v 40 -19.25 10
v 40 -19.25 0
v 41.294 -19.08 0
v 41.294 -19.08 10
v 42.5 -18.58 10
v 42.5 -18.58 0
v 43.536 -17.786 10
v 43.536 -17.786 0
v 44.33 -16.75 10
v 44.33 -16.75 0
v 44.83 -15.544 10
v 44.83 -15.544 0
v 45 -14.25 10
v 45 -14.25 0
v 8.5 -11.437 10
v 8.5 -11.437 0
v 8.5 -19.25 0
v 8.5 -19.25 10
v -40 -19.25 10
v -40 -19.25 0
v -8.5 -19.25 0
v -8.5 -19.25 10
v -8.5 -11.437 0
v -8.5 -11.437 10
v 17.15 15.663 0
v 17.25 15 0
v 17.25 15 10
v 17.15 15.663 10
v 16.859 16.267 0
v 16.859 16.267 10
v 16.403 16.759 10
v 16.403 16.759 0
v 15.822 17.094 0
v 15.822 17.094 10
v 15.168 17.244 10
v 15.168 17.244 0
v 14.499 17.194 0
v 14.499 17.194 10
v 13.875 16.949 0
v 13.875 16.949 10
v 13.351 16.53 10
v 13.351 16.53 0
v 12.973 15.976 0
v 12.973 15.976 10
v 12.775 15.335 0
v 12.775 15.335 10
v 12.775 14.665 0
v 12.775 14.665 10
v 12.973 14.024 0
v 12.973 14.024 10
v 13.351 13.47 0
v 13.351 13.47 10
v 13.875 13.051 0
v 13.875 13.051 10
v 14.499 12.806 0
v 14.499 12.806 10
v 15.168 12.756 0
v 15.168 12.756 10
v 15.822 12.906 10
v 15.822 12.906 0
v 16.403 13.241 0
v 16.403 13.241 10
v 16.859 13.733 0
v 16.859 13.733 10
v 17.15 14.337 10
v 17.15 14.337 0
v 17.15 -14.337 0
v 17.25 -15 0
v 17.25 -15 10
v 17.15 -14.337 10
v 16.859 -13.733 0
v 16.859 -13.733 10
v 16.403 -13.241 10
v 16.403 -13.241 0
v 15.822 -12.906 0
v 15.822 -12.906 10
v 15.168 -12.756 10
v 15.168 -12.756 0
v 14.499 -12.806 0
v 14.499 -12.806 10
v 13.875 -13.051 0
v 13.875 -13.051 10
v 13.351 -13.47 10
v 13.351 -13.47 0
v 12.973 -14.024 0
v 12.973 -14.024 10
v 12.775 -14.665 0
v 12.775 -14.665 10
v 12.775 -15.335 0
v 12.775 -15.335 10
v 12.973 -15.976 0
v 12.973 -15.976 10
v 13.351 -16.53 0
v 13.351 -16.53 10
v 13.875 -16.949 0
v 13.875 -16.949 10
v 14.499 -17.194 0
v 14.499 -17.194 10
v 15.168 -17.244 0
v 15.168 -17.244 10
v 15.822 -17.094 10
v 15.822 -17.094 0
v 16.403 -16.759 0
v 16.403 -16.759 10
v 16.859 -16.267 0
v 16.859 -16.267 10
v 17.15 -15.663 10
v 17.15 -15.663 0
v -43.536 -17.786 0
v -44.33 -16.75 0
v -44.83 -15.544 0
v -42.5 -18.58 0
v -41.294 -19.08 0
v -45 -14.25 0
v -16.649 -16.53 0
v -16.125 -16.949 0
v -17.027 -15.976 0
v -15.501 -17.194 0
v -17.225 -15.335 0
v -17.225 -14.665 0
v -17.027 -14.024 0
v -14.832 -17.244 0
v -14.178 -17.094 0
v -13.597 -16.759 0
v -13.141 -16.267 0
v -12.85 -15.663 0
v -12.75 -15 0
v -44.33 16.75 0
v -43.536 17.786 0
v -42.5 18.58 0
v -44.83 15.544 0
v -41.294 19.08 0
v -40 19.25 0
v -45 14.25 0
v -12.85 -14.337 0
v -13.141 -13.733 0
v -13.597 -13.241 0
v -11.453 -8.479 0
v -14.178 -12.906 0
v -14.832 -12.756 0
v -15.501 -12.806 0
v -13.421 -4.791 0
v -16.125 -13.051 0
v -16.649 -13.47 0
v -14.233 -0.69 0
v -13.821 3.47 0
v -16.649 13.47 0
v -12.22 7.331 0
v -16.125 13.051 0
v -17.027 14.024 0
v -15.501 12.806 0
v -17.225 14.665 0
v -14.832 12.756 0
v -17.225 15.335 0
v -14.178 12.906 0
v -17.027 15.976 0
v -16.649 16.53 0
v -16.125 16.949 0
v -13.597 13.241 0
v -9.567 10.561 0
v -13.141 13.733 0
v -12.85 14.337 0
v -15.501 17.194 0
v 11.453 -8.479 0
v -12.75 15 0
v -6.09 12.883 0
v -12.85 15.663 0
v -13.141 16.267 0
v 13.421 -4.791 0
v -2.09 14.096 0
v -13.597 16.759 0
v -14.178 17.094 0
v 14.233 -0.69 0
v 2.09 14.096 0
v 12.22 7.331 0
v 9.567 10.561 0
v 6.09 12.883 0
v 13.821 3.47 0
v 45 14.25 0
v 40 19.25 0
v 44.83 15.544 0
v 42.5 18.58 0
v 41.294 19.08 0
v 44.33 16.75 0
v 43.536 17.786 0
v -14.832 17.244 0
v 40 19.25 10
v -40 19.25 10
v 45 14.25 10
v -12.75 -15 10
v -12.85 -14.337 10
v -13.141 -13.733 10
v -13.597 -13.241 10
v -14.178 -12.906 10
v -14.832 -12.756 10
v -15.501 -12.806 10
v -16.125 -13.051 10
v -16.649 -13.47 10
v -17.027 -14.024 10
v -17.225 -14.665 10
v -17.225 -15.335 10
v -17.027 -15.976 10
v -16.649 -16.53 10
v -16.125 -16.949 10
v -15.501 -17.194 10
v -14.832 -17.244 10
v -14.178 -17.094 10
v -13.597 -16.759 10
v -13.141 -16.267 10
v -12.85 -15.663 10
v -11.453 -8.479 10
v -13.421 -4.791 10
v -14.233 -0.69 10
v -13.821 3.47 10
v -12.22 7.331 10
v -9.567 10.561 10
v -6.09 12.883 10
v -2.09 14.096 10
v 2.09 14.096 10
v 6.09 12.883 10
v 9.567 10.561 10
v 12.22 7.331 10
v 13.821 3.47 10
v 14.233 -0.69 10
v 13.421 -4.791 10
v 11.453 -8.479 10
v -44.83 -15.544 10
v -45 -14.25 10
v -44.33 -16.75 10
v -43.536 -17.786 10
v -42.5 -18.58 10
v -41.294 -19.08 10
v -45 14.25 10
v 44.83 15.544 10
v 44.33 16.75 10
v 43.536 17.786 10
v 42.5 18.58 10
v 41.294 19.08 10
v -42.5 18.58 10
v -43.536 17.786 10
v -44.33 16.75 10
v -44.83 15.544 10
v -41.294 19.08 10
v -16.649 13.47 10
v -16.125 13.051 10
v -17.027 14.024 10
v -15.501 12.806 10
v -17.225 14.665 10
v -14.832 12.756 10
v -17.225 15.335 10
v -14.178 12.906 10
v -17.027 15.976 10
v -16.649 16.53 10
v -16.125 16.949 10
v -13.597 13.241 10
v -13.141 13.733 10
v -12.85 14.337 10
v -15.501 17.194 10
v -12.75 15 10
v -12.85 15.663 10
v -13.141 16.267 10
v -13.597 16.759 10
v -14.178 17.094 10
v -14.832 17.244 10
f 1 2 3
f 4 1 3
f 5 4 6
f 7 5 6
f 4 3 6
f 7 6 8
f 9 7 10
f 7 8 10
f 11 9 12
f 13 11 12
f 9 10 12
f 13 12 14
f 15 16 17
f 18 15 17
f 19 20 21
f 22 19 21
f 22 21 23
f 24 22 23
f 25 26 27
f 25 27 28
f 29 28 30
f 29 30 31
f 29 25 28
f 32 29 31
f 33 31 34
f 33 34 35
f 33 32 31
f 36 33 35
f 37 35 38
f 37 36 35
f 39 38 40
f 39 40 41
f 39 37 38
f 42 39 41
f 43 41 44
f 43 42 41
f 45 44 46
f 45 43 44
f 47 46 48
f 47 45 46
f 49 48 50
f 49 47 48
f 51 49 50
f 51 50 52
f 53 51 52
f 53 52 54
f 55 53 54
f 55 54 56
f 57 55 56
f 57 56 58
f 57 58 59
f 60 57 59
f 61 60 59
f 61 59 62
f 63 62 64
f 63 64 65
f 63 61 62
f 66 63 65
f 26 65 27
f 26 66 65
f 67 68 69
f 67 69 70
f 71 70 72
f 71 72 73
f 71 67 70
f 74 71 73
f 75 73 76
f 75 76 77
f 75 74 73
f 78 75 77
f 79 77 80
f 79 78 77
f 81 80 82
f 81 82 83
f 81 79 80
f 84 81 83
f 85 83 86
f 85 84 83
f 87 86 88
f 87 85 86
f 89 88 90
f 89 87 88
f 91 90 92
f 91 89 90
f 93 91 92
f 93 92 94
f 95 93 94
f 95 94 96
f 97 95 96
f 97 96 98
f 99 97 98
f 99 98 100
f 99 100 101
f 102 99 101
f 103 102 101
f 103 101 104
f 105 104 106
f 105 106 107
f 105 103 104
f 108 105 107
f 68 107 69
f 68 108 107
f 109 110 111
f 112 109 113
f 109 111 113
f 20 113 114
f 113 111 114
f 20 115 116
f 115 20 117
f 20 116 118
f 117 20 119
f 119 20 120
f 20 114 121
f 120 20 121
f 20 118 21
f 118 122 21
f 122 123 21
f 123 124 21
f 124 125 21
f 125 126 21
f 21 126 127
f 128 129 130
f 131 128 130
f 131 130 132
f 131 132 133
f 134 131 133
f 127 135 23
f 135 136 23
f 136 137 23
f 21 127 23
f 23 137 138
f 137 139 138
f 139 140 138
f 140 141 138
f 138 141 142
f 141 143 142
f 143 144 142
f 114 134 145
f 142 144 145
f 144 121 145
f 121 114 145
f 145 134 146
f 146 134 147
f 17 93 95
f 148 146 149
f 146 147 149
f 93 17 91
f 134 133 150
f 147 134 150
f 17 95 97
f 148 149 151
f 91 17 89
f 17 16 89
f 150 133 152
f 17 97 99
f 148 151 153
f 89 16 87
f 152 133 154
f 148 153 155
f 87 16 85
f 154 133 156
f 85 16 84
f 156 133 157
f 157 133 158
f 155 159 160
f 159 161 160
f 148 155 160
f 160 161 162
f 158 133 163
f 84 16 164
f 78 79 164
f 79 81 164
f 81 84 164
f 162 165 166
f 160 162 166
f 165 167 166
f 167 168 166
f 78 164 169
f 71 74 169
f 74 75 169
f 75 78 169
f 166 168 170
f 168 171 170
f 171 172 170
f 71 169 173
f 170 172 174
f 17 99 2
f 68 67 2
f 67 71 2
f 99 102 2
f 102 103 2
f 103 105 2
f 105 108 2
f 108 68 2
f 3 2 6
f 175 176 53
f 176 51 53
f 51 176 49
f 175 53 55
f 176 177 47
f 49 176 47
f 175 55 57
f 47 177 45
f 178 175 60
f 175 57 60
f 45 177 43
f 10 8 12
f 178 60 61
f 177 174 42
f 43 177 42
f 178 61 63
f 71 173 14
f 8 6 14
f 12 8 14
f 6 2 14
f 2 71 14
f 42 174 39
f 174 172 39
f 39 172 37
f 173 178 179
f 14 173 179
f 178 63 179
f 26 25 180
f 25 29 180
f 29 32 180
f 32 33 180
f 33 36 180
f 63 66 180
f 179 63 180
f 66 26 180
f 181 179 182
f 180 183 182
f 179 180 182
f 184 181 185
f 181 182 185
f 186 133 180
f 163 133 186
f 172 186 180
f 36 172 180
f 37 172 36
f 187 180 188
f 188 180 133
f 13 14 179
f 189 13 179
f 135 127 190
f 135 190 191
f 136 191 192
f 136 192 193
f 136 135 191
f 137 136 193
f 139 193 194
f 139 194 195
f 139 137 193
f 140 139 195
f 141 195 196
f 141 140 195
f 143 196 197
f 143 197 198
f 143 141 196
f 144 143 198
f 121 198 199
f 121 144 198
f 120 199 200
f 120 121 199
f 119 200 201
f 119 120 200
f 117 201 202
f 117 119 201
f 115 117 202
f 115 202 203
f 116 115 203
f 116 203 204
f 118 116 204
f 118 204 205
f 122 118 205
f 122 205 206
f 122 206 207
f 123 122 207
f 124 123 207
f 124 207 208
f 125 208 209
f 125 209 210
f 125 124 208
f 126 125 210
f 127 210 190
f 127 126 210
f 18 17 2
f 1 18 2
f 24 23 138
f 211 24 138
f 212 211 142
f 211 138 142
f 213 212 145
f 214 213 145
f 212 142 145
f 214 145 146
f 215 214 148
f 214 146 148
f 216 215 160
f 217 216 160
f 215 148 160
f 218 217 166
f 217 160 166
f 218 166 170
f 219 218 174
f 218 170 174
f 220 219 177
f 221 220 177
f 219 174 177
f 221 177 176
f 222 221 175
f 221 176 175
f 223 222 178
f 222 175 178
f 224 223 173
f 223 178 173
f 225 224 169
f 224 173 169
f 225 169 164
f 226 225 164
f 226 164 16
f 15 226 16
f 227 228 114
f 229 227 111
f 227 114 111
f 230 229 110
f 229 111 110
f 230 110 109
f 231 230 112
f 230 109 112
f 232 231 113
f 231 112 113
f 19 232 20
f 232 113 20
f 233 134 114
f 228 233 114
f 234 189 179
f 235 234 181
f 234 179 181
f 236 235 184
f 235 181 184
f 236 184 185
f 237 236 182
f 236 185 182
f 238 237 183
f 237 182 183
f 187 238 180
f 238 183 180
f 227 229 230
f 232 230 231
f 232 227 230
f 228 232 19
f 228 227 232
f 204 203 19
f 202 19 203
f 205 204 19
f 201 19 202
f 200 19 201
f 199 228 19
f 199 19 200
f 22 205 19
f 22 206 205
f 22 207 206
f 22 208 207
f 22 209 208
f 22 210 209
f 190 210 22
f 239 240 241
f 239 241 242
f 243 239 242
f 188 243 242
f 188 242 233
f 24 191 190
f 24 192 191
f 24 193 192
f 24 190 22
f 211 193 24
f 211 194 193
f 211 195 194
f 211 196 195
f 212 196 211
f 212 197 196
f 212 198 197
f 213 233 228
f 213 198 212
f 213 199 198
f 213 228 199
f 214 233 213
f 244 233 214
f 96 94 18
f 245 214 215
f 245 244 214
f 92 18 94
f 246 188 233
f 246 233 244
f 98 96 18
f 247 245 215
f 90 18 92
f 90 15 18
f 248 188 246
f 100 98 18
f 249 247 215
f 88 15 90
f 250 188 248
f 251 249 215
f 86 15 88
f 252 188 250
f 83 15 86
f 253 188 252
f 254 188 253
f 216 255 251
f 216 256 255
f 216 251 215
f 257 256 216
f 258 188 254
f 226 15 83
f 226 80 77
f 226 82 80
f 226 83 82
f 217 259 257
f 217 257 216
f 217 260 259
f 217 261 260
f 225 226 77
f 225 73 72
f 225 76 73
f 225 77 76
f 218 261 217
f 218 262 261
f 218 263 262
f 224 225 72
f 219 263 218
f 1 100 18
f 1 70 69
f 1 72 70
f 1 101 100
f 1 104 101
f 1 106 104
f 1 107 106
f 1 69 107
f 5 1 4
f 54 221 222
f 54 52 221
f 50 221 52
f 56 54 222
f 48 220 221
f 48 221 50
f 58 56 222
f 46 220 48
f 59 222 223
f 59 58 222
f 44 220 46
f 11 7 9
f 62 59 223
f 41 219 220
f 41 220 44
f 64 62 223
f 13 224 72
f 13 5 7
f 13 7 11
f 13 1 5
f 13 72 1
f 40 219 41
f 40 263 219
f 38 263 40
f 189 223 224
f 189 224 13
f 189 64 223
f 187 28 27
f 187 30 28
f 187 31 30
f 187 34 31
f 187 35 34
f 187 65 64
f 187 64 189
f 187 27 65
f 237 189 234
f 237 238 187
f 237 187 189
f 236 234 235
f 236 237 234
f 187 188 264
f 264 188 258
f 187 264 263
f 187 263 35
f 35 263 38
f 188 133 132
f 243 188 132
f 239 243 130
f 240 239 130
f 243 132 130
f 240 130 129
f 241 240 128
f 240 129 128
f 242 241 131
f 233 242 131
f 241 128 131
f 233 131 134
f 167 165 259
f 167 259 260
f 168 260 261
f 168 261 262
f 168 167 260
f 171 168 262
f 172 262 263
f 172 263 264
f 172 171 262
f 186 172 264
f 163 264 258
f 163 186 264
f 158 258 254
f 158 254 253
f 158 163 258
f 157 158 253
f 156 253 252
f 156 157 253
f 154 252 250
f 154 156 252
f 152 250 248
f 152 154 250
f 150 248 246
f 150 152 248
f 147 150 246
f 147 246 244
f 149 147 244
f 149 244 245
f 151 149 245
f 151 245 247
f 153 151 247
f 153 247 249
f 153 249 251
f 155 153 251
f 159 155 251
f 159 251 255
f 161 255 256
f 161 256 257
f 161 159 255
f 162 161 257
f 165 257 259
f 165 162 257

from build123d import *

# Parameters (mm, degrees)
SKETCH1_R           = 2.25
BOSS_EXTRUDE1_DEPTH = 10


with BuildPart() as part:
    # Sketch1 → Boss-Extrude1 (new body)
    with BuildSketch(Plane.XY):
        with BuildLine():
            Line((15, 19.25), (-15, 19.25))
            Line((-15, 19.25), (-30, 19.25))
            Line((-30, 19.25), (-40, 19.25))
            ThreePointArc((-40, 19.25), (-43.535533906, 17.785533906), (-45, 14.25))
            Line((-45, 14.25), (-45, -14.25))
            ThreePointArc((-45, -14.25), (-43.535533906, -17.785533906), (-40, -19.25))
            Line((-40, -19.25), (-30, -19.25))
            Line((-30, -19.25), (-15, -19.25))
            Line((-15, -19.25), (-8.5, -19.25))
            Line((-8.5, -19.25), (-8.5, -16.75))
            Line((-8.5, -16.75), (-8.5, -11.437329234))
            ThreePointArc((-8.5, -11.437329234), (0, 14.25), (8.5, -11.437329234))
            Line((8.5, -11.437329234), (8.5, -16.75))
            Line((8.5, -16.75), (8.5, -19.25))
            Line((8.5, -19.25), (15, -19.25))
            Line((15, -19.25), (30, -19.25))
            Line((30, -19.25), (40, -19.25))
            ThreePointArc((40, -19.25), (43.535533906, -17.785533906), (45, -14.25))
            Line((45, -14.25), (45, 14.25))
            ThreePointArc((45, 14.25), (43.535533906, 17.785533906), (40, 19.25))
            Line((40, 19.25), (30, 19.25))
            Line((30, 19.25), (15, 19.25))
        make_face()
        with Locations((-15, -15)):
            Circle(SKETCH1_R, mode=Mode.SUBTRACT)
        with Locations((15, -15)):
            Circle(SKETCH1_R, mode=Mode.SUBTRACT)
        with Locations((-15, 15)):
            Circle(SKETCH1_R, mode=Mode.SUBTRACT)
        with Locations((15, 15)):
            Circle(SKETCH1_R, mode=Mode.SUBTRACT)
    extrude(amount=BOSS_EXTRUDE1_DEPTH)


solid = part.part
